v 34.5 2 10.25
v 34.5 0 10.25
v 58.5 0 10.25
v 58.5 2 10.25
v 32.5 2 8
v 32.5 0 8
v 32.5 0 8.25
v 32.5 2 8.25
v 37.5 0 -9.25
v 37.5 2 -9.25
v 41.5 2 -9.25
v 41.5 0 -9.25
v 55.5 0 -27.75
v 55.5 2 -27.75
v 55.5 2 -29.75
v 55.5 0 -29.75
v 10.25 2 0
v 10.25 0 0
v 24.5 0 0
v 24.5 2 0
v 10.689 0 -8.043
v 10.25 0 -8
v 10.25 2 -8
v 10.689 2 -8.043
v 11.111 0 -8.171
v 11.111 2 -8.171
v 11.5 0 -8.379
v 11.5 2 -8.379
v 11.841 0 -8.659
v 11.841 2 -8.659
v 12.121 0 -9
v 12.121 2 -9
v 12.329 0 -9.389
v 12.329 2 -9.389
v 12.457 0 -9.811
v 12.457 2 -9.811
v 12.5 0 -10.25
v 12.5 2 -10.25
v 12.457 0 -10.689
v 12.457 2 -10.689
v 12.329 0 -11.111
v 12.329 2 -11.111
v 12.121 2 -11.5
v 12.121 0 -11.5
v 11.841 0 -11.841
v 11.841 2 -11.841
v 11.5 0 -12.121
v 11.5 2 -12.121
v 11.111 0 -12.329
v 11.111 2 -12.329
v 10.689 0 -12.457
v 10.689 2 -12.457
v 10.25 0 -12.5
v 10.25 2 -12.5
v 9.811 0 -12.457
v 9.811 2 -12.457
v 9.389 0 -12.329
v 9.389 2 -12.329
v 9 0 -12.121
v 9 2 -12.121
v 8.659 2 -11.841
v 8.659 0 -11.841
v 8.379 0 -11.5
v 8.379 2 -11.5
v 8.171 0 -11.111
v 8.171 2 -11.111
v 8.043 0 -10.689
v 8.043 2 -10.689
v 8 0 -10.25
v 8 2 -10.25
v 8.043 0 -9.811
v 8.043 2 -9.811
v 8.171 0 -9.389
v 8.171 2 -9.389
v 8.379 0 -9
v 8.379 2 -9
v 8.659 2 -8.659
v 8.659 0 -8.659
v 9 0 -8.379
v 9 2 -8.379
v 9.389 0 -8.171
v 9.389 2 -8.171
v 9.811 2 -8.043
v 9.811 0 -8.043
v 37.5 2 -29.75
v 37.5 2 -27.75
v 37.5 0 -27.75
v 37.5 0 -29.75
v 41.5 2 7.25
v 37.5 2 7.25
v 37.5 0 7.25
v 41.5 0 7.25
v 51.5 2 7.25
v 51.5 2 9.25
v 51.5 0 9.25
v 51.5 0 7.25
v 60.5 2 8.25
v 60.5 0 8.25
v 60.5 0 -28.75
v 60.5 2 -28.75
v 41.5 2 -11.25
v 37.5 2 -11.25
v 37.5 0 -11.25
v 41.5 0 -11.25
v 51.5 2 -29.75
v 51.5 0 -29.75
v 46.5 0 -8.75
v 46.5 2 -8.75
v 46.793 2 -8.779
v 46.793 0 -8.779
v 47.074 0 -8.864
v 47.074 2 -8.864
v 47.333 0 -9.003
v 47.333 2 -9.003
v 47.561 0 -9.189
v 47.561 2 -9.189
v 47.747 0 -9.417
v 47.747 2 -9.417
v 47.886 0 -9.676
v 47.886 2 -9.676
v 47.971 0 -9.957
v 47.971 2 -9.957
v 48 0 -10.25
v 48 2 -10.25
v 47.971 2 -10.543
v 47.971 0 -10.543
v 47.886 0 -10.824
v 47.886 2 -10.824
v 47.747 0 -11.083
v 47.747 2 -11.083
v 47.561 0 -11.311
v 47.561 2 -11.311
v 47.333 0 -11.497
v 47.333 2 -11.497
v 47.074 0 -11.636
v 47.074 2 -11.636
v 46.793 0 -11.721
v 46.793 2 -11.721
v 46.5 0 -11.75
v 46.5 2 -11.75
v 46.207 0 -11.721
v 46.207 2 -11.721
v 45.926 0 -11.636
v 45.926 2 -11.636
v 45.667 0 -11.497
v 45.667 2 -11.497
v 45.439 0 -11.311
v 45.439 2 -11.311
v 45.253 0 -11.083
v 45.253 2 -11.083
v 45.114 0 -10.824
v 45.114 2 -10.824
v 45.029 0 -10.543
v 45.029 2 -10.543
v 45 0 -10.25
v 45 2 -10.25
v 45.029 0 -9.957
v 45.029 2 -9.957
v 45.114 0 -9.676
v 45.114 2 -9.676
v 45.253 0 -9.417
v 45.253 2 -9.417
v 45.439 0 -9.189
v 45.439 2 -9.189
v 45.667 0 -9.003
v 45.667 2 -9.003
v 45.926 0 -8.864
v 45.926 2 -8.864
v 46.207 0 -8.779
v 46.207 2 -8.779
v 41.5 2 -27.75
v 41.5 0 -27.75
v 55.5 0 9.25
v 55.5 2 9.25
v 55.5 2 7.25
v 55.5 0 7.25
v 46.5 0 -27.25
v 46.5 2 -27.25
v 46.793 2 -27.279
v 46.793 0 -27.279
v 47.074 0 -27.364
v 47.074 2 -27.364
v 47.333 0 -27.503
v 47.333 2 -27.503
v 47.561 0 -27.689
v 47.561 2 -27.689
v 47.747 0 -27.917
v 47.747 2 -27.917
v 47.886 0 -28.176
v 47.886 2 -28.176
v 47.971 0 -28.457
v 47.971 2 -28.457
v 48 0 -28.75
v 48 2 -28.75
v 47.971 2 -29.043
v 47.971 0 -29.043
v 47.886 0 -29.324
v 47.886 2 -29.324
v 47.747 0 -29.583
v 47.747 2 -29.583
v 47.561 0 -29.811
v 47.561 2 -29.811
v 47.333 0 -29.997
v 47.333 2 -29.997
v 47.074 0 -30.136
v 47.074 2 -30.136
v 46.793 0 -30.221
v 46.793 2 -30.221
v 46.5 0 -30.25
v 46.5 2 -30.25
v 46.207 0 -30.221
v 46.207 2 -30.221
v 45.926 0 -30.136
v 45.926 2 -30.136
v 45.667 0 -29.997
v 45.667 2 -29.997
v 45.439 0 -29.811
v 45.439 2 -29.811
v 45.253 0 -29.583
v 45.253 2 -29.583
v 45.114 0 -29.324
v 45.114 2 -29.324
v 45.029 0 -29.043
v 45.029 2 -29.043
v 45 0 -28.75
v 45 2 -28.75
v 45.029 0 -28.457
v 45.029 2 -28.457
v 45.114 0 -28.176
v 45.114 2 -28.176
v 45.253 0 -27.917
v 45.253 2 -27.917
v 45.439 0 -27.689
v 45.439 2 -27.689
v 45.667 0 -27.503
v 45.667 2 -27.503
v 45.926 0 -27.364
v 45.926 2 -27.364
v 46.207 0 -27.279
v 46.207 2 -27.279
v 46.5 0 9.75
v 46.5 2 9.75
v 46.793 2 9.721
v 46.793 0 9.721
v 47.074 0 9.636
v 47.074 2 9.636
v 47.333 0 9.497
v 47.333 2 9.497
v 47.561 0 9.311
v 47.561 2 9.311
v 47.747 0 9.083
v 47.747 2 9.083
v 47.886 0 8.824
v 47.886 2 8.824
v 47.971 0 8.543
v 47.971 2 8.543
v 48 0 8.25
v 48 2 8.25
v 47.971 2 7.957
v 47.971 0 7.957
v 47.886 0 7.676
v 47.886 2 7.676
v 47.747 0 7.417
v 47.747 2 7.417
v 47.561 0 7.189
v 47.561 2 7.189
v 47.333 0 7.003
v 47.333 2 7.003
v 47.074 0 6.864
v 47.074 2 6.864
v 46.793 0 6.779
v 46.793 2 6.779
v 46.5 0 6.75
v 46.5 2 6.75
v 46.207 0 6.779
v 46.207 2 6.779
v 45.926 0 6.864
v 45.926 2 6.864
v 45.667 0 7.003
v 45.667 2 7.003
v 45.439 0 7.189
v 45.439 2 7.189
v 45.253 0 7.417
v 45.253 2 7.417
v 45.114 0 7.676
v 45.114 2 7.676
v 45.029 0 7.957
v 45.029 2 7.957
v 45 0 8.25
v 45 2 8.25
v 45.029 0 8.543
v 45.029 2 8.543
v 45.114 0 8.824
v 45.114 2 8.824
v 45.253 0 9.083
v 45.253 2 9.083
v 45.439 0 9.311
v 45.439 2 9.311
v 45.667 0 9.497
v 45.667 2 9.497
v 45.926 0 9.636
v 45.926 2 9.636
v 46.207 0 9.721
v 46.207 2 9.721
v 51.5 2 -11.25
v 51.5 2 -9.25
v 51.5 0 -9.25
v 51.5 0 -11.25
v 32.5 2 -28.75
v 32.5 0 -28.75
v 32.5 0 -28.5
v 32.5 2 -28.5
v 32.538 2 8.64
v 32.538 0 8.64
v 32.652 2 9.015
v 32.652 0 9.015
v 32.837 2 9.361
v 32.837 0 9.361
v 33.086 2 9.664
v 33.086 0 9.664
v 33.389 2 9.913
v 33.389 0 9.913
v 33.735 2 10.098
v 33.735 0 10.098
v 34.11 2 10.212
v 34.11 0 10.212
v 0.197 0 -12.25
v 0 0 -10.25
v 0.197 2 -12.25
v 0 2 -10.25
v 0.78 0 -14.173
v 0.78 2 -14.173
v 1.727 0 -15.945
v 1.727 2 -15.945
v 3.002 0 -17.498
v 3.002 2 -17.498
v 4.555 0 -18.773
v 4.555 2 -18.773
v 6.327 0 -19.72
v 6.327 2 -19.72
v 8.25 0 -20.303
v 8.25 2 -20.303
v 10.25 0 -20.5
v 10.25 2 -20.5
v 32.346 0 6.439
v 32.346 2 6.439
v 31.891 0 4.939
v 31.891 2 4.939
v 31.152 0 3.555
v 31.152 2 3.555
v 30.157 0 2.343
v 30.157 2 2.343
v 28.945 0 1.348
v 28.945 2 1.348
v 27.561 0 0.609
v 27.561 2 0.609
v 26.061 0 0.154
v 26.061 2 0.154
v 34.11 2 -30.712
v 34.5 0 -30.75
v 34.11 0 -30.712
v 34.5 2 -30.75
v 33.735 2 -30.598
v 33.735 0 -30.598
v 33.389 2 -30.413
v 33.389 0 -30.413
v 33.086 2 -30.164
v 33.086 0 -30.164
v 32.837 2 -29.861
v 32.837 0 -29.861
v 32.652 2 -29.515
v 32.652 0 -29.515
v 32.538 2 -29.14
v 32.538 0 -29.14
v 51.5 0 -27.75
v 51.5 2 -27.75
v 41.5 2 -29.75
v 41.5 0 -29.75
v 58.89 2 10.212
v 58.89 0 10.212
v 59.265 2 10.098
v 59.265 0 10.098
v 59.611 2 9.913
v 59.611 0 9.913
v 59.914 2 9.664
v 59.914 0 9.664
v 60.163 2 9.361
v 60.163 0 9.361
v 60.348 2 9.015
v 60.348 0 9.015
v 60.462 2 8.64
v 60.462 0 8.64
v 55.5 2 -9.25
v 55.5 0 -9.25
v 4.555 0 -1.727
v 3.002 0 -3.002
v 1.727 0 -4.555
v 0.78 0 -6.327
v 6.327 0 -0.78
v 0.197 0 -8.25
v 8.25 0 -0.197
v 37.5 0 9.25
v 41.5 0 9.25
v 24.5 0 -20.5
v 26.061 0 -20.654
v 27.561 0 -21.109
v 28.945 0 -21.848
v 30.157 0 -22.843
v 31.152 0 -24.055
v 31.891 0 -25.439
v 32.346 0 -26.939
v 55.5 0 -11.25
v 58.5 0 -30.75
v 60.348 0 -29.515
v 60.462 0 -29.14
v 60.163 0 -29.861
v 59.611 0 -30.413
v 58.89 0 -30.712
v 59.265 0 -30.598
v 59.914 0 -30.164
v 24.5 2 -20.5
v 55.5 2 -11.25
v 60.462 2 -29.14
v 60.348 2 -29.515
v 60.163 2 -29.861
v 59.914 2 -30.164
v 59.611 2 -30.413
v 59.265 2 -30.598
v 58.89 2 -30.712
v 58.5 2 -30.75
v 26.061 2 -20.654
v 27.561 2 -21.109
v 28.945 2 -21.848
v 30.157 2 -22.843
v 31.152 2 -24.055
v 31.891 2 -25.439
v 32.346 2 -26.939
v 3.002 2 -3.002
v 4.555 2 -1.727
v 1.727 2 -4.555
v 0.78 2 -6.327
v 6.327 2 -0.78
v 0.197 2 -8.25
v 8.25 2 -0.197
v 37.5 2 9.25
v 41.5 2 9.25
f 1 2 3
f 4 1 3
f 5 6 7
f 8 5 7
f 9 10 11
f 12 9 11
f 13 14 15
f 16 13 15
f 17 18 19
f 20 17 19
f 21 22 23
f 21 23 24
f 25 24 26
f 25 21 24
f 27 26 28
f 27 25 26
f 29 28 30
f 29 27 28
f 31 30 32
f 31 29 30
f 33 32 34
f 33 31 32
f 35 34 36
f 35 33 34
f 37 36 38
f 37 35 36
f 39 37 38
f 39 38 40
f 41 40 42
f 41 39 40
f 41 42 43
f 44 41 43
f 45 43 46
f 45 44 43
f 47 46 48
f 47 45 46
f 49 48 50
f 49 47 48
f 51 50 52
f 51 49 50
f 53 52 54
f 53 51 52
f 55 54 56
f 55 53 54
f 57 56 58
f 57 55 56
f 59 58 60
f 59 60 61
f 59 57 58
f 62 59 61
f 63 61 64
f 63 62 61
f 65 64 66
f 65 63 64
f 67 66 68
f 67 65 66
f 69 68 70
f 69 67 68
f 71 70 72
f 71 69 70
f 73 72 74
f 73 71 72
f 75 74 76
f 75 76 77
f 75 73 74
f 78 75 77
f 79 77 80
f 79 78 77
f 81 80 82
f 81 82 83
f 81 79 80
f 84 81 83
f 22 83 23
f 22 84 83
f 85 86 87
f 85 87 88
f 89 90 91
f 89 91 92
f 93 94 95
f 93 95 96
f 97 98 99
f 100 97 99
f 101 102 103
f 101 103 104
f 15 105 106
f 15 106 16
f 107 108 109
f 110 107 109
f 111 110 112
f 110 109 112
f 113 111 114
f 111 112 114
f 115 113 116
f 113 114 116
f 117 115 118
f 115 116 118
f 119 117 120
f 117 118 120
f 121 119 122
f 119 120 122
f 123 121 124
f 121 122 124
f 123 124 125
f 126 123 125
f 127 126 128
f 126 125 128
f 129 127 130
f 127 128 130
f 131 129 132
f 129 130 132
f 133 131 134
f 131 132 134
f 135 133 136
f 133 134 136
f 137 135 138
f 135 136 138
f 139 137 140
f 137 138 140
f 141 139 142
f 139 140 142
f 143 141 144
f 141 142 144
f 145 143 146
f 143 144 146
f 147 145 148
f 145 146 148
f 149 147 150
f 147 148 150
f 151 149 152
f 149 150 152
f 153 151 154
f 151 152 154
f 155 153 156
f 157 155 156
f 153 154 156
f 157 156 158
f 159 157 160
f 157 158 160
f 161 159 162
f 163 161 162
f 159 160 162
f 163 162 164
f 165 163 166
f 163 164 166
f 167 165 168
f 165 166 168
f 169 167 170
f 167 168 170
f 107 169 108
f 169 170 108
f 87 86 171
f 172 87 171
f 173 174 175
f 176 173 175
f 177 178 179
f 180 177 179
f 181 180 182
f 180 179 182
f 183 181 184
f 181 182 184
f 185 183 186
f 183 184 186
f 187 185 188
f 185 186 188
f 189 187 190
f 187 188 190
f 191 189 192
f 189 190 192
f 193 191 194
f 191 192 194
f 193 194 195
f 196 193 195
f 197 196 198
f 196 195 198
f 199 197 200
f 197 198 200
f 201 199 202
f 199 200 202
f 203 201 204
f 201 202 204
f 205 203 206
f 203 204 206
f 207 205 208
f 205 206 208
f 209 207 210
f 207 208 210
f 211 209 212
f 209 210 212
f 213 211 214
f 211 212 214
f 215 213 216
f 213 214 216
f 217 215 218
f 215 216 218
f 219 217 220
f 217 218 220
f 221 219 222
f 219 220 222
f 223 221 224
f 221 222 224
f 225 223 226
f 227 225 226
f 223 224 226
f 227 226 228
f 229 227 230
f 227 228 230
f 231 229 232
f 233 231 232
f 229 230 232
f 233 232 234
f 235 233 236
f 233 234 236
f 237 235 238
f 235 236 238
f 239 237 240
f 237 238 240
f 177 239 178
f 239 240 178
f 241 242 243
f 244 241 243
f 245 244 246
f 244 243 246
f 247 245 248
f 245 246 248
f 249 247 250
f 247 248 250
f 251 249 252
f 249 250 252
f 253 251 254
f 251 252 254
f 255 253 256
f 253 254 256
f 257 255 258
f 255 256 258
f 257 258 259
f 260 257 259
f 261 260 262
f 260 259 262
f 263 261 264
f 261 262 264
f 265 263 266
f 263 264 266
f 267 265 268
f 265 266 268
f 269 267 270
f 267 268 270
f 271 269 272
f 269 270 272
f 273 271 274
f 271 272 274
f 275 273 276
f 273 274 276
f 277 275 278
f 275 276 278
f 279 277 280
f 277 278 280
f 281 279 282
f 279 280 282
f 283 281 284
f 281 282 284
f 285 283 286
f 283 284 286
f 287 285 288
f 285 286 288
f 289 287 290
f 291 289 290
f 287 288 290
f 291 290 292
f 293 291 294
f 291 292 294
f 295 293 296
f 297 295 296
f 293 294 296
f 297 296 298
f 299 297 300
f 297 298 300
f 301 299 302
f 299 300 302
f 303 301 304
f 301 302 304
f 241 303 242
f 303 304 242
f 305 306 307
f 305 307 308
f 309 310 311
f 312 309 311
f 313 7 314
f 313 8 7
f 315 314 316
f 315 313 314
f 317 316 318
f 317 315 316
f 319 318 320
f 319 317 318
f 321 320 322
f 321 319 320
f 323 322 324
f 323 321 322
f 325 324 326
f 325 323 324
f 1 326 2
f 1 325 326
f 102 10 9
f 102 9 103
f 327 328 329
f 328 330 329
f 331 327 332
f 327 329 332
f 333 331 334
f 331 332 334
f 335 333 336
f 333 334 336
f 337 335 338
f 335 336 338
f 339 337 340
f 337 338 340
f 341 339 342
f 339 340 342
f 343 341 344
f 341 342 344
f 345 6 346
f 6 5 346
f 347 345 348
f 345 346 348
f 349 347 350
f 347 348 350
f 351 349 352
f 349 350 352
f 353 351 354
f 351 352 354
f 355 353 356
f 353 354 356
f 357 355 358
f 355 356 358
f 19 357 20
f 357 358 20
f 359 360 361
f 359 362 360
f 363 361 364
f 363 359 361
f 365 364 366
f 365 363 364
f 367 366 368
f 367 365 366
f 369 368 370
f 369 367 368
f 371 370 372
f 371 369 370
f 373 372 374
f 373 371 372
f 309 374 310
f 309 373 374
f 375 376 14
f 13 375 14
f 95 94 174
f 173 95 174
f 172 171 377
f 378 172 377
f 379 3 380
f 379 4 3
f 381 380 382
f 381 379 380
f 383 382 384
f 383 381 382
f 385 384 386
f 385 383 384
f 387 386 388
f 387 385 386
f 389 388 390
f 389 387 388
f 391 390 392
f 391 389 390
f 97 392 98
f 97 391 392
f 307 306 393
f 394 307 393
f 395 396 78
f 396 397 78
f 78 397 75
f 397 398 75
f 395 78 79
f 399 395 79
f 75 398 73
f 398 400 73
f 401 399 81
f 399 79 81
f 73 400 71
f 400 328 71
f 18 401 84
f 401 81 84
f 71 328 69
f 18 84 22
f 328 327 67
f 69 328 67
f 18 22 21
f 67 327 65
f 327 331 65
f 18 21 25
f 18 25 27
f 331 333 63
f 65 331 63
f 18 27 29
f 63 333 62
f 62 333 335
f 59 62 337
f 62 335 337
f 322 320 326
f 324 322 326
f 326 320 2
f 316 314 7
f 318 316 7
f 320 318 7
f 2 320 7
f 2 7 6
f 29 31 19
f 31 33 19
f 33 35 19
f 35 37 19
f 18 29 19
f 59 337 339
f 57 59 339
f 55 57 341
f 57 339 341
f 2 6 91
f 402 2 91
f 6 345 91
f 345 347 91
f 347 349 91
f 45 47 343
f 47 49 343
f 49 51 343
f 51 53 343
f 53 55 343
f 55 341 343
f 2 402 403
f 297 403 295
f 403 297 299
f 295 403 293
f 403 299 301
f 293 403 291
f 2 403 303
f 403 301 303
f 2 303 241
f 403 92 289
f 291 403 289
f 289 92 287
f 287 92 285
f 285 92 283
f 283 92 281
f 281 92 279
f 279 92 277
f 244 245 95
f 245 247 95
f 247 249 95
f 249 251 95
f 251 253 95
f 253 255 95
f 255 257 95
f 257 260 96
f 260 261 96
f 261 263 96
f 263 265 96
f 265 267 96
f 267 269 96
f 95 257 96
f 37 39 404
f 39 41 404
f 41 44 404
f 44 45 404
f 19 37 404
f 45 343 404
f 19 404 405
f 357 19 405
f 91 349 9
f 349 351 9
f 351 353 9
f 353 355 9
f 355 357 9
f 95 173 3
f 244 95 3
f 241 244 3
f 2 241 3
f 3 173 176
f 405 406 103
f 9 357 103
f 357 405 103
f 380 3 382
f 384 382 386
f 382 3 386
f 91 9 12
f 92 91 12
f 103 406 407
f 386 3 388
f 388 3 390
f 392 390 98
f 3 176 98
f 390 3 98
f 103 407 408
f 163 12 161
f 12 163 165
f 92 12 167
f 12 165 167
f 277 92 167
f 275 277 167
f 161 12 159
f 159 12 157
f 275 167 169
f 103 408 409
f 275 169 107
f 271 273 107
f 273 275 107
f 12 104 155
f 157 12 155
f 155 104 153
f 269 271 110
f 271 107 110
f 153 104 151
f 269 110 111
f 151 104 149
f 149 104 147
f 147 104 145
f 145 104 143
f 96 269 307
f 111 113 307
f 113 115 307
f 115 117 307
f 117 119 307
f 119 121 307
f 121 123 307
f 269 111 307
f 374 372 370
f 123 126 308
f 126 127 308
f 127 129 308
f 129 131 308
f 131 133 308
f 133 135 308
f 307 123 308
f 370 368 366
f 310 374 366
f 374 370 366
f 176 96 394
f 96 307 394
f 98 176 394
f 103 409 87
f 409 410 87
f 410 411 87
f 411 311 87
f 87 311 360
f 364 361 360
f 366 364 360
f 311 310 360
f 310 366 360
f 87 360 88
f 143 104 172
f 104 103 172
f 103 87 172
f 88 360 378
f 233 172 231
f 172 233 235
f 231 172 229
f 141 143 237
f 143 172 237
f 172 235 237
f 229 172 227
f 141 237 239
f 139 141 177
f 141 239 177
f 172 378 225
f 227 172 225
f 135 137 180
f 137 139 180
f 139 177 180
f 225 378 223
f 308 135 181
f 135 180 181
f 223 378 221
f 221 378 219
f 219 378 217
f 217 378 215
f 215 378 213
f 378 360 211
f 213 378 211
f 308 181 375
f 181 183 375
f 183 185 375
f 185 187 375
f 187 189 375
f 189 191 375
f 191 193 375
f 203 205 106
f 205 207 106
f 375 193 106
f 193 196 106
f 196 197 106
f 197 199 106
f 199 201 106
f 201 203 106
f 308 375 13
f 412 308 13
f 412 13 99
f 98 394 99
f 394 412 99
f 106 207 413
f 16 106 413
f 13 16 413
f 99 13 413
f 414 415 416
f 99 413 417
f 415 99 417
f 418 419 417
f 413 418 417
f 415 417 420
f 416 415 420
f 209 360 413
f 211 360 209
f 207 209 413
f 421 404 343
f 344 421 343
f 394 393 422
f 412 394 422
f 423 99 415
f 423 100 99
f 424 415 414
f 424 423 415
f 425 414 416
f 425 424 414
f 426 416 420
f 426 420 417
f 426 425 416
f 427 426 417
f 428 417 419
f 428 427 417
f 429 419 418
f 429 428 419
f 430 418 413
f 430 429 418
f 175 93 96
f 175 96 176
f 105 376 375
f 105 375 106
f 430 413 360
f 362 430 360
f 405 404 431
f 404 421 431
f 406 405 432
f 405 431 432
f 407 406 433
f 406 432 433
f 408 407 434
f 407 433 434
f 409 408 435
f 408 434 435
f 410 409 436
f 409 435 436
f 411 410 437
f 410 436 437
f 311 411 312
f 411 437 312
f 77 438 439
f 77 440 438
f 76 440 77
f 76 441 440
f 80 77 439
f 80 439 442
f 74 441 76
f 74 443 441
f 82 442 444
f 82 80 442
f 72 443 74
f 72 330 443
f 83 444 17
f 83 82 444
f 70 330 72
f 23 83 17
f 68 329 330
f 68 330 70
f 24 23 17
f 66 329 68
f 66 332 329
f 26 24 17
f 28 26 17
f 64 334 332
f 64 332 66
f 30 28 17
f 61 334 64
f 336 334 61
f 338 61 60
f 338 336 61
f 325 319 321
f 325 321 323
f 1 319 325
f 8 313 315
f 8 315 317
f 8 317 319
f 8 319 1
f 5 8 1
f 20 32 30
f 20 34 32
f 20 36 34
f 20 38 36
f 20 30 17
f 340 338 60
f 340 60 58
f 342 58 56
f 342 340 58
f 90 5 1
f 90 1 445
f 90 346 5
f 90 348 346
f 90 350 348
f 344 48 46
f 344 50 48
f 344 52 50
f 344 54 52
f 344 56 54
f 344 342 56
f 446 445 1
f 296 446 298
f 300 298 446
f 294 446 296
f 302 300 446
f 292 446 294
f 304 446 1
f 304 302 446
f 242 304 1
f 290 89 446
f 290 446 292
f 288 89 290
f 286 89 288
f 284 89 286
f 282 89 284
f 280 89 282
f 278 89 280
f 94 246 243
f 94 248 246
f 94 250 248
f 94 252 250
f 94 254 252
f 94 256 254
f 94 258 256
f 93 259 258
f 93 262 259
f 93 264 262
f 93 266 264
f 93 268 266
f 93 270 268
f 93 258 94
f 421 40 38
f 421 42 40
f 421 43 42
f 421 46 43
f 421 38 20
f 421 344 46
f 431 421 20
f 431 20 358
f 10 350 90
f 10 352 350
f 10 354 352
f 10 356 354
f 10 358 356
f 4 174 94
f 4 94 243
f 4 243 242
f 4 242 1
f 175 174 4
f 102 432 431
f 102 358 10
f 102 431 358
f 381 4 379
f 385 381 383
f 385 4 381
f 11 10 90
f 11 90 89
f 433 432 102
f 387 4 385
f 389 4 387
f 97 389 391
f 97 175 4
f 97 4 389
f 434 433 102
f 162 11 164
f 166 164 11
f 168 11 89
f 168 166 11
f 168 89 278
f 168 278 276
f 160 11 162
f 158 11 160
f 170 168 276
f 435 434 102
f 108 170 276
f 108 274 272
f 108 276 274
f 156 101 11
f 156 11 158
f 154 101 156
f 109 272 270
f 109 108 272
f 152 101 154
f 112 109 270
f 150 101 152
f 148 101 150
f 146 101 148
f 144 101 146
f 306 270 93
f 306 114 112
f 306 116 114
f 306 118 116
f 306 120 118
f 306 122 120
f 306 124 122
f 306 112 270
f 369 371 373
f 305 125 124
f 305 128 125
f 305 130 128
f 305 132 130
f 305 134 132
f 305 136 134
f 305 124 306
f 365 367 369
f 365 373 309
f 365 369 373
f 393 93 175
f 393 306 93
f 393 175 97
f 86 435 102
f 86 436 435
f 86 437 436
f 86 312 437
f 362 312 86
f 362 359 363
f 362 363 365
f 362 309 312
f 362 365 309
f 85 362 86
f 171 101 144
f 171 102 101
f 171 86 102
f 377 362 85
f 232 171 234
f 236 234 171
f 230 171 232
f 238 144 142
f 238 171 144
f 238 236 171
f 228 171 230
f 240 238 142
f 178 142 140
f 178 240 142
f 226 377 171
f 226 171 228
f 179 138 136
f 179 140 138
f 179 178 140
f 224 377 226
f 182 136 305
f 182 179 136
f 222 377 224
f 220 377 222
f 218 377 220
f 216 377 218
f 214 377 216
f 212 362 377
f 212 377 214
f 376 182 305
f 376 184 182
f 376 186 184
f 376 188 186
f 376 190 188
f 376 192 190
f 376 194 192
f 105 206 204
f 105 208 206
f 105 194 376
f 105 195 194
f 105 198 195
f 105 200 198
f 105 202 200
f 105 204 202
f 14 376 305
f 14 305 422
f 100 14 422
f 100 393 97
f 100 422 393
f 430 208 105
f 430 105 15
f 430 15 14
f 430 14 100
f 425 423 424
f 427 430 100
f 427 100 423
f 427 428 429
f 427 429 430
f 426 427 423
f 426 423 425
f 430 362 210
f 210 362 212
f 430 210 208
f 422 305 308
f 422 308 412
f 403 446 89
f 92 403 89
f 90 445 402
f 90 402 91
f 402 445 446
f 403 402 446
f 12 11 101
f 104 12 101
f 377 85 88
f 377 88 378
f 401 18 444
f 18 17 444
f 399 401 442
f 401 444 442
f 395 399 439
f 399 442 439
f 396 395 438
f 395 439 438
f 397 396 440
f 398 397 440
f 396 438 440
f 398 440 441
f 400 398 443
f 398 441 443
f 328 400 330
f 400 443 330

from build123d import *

# Parameters (mm, degrees)
SKETCH1_R           = 2.25
BOSS_EXTRUDE1_DEPTH = 2
FILLET1_R           = 10.25
FILLET2_R           = 2
SKETCH2_R           = 1.5
SKETCH2_W           = 4
SKETCH2_H           = 2
CUT_EXTRUDE1_DEPTH  = 2
FILLET3_R           = 8


with BuildPart() as part:
    # Sketch1 → Boss-Extrude1 (new body)
    with BuildSketch(Plane(origin=(0, 0, 0), x_dir=(1, 0, 0), z_dir=(0, 1, 0))):
        Polygon((0, 0), (32.5, 0), (32.5, -10.25), (60.5, -10.25), (60.5, -0.75), (60.5, 21.25), (60.5, 30.75), (32.5, 30.75), (32.5, 20.5), (0, 20.5), align=None)
        with Locations(Location((10.25, 10.25, 0), (0, 0, 270))):
            Circle(SKETCH1_R, mode=Mode.SUBTRACT)
    extrude(amount=BOSS_EXTRUDE1_DEPTH)

    # Fillet1
    fillet1_edges = [part.edges().sort_by_distance(p)[0] for p in [
        (0, 1, -20.5),
        (0, 1, 0),
    ]]
    fillet(fillet1_edges, radius=FILLET1_R - 0.0001)  # a hair under: the kernel refuses the full size

    # Fillet2
    fillet2_edges = [part.edges().sort_by_distance(p)[0] for p in [
        (32.5, 1, -30.75),
        (60.5, 1, -30.75),
        (60.5, 1, 10.25),
        (32.5, 1, 10.25),
    ]]
    fillet(fillet2_edges, radius=FILLET2_R)

    # Sketch2 → Cut-Extrude1 (cut)
    with BuildSketch(Plane(origin=(0, 2, 0), x_dir=(1, 0, 0), z_dir=(0, 1, 0))):
        with Locations(Location((46.5, 28.75, 0), (0, 0, 270))):
            Circle(SKETCH2_R)
        with Locations(Location((46.5, 10.25, 0), (0, 0, 270))):
            Circle(SKETCH2_R)
        with Locations(Location((46.5, -8.25, 0), (0, 0, 270))):
            Circle(SKETCH2_R)
        with Locations((39.5, 28.75)):
            Rectangle(SKETCH2_W, SKETCH2_H)
        with Locations((53.5, 28.75)):
            Rectangle(SKETCH2_W, SKETCH2_H)
        with Locations((39.5, 10.25)):
            Rectangle(SKETCH2_W, SKETCH2_H)
        with Locations((53.5, 10.25)):
            Rectangle(SKETCH2_W, SKETCH2_H)
        with Locations((39.5, -8.25)):
            Rectangle(SKETCH2_W, SKETCH2_H)
        with Locations((53.5, -8.25)):
            Rectangle(SKETCH2_W, SKETCH2_H)
    extrude(amount=-CUT_EXTRUDE1_DEPTH, mode=Mode.SUBTRACT)

    # Fillet3
    fillet3_edges = [part.edges().sort_by_distance(p)[0] for p in [
        (32.5, 1, -20.5),
        (32.5, 1, 0),
    ]]
    fillet(fillet3_edges, radius=FILLET3_R)


solid = part.part
